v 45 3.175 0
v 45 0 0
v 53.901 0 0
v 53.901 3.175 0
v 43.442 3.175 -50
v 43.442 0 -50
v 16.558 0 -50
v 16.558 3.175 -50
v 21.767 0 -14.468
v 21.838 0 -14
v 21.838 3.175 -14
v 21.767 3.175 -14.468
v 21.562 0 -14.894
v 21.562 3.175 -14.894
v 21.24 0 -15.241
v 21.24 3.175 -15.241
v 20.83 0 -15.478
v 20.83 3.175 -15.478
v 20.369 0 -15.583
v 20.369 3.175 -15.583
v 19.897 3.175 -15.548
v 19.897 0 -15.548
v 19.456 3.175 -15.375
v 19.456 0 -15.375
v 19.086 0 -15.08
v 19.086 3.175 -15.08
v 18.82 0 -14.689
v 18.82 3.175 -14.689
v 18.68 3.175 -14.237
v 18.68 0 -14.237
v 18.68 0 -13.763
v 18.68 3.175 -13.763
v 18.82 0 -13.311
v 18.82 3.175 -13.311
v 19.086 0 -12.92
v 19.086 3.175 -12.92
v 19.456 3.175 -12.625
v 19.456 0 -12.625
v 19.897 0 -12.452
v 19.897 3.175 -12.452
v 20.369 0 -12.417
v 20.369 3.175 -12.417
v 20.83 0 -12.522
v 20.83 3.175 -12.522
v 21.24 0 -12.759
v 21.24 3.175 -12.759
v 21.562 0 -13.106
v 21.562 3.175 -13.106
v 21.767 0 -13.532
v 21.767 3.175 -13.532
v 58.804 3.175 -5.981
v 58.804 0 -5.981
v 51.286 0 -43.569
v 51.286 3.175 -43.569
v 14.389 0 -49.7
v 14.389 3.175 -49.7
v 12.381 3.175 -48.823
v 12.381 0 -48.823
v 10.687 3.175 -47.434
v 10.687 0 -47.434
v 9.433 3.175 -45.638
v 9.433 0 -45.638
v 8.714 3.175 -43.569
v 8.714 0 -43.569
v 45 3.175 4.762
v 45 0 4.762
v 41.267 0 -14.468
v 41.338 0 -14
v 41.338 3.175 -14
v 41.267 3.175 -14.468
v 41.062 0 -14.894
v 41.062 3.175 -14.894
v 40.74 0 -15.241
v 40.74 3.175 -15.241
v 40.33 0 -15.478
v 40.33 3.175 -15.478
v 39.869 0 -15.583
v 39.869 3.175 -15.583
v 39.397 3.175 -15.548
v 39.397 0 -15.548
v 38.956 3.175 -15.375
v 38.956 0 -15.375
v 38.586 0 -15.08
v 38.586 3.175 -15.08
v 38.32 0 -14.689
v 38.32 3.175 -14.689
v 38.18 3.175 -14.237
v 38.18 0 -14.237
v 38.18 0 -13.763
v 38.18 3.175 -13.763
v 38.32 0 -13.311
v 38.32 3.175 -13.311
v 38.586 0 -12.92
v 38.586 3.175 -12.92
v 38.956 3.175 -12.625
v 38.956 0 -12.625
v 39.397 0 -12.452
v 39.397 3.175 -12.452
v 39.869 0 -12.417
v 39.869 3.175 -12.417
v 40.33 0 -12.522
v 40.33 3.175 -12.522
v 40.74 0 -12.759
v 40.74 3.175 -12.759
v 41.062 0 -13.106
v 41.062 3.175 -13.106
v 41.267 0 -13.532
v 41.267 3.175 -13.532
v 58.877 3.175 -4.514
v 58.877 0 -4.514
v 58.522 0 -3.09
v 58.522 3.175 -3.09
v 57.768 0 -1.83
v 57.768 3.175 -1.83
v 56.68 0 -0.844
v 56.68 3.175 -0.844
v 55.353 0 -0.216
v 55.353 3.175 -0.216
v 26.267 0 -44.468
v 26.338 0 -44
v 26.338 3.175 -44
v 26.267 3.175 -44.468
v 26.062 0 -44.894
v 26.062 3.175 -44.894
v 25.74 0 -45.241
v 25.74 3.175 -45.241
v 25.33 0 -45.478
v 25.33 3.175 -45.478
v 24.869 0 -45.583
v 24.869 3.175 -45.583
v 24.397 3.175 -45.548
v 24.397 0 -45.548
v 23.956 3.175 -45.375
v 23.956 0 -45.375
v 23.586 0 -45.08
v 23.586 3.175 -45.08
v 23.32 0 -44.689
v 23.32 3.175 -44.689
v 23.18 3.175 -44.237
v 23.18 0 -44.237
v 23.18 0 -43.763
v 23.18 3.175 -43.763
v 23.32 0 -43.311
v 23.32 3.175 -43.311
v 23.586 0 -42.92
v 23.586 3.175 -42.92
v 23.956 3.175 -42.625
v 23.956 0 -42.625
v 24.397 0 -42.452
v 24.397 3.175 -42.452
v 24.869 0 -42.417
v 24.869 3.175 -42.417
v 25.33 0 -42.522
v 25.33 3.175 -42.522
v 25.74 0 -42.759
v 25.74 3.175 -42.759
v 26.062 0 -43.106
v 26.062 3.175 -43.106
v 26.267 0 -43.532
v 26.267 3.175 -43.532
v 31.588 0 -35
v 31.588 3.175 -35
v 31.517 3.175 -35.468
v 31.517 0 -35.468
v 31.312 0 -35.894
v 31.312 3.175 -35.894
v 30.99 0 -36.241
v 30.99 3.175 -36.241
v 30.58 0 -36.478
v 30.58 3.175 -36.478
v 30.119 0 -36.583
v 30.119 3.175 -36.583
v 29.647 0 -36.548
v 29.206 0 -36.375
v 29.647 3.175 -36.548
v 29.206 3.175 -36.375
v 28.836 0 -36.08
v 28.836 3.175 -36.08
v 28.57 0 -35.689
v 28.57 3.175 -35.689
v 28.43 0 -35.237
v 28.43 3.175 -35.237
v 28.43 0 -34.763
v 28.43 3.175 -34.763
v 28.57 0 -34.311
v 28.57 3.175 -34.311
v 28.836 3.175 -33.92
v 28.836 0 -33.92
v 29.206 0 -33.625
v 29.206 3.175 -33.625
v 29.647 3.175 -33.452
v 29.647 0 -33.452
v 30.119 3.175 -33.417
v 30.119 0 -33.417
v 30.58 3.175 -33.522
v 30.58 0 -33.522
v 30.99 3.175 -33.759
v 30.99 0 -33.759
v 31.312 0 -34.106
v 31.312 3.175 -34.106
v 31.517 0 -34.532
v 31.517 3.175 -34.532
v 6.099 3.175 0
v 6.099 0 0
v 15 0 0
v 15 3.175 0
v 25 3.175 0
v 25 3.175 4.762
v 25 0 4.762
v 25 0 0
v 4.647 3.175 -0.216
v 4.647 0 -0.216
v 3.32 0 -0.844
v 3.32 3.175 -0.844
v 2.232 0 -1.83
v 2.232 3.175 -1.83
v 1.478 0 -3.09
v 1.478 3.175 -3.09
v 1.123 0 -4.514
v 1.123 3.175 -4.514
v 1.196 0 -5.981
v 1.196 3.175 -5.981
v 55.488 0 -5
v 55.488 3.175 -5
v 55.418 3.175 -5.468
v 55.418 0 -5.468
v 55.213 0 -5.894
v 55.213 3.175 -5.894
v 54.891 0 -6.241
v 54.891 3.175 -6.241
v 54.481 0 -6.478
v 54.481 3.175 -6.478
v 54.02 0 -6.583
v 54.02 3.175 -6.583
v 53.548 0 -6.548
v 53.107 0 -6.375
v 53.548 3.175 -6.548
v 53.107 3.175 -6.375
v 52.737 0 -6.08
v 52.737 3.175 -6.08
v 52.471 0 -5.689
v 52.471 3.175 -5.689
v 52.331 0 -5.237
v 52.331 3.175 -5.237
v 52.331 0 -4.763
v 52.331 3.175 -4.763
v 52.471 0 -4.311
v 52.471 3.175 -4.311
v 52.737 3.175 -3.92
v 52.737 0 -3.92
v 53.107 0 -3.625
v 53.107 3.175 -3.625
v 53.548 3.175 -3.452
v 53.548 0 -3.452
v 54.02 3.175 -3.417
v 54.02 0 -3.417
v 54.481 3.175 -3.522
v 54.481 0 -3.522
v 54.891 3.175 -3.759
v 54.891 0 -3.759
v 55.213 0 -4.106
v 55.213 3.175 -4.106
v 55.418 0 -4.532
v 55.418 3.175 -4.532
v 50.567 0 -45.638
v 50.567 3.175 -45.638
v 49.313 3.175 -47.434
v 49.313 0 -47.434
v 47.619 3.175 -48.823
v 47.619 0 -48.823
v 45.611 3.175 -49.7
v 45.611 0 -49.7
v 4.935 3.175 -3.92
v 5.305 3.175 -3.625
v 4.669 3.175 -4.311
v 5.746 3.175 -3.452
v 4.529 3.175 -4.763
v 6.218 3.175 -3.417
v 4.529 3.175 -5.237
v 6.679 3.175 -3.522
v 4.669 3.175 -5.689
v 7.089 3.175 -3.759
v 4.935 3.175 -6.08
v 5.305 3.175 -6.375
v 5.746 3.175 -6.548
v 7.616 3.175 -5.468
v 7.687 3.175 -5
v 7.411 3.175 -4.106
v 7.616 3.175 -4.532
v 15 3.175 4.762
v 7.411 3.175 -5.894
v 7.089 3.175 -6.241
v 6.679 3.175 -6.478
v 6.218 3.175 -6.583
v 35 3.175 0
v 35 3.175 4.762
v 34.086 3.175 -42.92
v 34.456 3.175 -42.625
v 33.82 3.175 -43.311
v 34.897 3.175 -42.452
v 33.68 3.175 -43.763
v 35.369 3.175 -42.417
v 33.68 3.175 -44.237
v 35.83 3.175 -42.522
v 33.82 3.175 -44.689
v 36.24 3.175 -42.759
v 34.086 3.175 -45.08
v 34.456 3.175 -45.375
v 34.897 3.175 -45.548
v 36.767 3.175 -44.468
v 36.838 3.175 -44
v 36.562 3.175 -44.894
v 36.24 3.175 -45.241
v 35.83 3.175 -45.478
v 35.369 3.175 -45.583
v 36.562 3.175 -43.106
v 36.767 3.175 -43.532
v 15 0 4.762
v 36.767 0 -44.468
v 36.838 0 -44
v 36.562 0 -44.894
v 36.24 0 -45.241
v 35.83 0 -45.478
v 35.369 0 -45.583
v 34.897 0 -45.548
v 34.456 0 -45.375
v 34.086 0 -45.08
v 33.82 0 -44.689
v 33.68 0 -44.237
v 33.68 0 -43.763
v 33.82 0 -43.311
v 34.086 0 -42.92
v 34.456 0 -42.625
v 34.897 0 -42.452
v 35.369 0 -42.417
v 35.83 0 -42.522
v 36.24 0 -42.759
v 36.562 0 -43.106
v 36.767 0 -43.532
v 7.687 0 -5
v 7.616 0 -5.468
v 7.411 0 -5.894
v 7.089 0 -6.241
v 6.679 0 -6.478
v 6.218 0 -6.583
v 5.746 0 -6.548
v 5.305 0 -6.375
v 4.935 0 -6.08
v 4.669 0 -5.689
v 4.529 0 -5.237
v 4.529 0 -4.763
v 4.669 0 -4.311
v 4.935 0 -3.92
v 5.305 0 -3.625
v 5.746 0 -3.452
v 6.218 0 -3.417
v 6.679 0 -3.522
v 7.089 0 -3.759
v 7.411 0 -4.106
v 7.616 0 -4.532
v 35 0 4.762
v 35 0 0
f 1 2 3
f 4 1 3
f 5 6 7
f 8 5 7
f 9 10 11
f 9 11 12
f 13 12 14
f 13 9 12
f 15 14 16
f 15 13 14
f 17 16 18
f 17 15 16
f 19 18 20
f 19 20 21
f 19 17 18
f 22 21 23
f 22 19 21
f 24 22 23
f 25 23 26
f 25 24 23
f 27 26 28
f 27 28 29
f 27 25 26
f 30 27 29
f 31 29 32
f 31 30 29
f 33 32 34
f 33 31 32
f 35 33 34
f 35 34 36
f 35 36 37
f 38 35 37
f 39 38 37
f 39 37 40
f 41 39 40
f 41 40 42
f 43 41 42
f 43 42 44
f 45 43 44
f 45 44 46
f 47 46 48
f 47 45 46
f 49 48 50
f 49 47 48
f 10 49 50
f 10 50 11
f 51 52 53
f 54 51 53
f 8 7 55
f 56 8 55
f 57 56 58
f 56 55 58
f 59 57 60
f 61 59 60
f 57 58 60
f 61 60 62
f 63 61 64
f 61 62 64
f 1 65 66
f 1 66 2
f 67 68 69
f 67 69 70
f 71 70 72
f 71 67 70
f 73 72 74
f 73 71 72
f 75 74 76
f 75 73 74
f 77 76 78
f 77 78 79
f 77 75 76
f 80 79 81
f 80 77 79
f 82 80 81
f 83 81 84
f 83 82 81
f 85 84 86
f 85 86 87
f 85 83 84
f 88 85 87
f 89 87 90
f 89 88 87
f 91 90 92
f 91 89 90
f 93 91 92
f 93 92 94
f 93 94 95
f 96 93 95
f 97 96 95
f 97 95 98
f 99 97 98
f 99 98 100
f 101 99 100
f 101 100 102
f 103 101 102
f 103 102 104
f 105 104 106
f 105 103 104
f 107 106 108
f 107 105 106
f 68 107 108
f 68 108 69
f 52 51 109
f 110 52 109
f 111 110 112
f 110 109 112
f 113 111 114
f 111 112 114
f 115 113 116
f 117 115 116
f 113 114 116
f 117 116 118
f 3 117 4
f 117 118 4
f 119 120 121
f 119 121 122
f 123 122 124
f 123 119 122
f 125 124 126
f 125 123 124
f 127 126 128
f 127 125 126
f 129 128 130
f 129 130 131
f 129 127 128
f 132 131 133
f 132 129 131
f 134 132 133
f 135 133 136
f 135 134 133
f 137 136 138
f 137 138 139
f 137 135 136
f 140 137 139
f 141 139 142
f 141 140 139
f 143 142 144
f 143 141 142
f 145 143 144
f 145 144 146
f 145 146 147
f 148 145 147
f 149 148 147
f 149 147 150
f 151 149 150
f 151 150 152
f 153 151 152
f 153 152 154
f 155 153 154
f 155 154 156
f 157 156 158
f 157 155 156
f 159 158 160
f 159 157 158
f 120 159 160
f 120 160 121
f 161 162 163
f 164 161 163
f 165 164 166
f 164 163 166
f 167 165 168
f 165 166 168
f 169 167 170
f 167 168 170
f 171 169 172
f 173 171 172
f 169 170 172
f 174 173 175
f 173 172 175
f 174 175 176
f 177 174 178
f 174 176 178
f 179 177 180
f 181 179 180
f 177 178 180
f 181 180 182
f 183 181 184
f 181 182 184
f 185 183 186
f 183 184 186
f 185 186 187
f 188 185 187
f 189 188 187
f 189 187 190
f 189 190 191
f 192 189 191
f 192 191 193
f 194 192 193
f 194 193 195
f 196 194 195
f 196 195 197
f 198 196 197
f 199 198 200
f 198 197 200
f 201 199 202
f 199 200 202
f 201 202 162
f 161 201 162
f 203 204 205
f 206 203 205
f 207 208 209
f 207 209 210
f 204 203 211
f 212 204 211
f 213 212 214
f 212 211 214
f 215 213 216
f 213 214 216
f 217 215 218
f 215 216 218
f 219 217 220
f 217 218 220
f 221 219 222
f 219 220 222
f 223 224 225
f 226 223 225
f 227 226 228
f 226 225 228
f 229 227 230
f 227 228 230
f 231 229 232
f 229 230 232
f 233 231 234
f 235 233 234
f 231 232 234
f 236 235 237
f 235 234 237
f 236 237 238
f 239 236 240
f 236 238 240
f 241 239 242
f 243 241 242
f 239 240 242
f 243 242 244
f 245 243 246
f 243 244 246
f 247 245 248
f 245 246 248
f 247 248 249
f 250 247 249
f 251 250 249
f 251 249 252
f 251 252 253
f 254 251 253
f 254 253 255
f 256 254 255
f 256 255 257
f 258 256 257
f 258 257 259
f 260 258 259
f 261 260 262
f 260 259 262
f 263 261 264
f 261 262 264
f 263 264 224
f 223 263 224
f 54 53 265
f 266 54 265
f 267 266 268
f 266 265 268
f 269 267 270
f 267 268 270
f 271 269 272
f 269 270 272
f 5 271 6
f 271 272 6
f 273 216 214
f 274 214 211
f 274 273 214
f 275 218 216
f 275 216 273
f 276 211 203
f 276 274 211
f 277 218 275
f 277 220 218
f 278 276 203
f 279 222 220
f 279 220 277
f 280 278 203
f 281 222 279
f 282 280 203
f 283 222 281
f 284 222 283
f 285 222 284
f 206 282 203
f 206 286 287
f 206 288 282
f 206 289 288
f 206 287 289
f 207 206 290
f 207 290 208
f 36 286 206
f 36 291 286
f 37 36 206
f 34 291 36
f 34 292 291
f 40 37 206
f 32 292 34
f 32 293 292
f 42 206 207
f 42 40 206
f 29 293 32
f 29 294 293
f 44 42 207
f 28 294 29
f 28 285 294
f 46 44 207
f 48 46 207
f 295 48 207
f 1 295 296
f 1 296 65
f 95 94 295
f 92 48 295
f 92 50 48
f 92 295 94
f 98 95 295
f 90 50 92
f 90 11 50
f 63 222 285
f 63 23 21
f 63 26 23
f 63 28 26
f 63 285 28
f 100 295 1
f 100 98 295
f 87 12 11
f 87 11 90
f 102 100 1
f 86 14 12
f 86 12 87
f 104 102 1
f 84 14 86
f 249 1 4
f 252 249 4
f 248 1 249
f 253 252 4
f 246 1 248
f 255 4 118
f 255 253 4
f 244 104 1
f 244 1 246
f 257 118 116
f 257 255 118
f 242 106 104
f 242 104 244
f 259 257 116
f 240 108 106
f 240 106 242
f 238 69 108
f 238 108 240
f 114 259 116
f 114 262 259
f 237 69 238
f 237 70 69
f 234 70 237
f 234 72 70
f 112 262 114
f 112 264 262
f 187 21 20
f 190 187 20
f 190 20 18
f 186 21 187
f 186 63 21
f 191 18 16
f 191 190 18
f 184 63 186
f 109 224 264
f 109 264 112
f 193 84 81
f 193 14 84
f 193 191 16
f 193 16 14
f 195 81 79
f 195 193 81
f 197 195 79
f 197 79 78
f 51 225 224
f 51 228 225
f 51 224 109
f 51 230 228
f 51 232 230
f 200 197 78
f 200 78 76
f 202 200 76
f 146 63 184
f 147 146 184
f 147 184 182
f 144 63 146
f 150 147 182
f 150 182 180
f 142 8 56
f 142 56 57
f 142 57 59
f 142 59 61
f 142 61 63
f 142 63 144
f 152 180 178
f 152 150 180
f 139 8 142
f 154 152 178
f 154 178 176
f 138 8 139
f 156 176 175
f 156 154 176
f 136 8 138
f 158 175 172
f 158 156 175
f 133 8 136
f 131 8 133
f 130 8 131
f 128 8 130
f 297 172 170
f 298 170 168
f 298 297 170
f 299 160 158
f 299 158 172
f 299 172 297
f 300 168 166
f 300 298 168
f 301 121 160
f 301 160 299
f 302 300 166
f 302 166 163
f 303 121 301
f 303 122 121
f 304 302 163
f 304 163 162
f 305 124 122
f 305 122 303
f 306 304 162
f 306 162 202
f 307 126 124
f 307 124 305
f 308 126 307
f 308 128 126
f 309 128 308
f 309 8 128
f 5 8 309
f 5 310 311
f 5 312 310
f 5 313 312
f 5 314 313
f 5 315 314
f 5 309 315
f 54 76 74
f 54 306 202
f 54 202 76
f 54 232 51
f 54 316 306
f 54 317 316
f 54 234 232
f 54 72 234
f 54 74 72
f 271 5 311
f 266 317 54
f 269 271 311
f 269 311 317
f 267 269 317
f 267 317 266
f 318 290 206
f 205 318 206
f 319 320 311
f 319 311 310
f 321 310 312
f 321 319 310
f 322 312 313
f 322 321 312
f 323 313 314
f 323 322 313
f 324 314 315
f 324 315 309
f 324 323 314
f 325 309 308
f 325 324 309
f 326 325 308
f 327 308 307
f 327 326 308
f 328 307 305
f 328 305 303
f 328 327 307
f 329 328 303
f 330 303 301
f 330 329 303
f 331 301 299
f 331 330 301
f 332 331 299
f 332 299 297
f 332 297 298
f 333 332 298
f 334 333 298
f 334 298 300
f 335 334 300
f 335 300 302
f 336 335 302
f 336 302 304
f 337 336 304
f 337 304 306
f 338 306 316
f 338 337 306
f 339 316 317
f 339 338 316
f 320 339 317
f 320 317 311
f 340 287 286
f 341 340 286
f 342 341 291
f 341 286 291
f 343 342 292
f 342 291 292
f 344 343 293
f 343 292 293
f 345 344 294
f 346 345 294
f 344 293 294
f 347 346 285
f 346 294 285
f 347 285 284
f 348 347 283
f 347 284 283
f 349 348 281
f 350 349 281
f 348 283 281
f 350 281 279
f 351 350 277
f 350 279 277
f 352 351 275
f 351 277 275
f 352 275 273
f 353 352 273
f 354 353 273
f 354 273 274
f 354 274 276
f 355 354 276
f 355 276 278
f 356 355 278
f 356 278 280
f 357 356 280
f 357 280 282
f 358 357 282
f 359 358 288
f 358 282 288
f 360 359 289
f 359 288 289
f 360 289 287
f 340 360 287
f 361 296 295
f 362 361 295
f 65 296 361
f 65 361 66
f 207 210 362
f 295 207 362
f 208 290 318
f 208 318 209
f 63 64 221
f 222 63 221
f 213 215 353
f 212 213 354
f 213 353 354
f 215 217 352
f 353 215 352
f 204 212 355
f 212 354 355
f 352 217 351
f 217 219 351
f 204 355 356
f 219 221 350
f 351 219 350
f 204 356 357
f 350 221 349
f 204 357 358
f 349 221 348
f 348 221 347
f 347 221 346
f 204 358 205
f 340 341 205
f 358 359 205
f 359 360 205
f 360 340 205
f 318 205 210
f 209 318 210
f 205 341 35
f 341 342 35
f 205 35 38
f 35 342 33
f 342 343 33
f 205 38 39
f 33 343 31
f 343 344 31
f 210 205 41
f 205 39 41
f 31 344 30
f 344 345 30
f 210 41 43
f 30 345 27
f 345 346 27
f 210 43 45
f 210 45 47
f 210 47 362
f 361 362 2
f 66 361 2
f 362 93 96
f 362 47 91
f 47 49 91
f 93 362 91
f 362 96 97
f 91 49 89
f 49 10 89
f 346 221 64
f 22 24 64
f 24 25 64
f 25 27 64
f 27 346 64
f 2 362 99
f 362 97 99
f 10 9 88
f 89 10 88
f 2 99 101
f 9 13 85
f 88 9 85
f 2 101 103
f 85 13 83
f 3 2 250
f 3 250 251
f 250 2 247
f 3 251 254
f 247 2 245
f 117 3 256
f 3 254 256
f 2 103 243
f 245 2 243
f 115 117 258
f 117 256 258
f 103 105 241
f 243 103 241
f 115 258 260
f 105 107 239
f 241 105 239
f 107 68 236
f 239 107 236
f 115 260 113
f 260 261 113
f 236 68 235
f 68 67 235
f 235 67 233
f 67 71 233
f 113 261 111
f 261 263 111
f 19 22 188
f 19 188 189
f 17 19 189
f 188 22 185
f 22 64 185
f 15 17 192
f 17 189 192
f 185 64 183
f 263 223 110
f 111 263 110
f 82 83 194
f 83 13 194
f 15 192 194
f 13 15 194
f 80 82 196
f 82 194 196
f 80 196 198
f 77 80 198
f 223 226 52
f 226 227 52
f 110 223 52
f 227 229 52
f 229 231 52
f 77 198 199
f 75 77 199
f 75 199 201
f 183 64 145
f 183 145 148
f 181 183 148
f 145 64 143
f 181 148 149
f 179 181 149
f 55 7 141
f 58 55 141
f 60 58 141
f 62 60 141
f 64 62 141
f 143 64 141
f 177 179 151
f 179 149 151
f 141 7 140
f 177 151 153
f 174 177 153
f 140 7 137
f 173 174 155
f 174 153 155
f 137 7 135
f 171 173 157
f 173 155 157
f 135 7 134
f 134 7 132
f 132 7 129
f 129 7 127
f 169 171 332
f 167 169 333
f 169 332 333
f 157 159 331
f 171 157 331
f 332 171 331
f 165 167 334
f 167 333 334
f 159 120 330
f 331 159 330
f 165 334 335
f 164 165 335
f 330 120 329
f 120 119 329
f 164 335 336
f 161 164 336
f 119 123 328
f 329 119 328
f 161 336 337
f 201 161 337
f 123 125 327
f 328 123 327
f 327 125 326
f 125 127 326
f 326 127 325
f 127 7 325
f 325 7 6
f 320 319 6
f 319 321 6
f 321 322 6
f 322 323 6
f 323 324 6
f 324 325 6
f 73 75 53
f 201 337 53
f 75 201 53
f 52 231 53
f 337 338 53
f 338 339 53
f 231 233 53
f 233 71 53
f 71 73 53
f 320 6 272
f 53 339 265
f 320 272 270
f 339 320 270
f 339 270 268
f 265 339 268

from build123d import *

# Parameters (mm, degrees)
CROQUIS1_R              = 1.5875
SALIENTE_EXTRUIR1_DEPTH = 3.175
CROQUIS2_R              = 1.5875
CORTAR_EXTRUIR1_DEPTH   = 3.175
CROQUIS3_W              = 10
CROQUIS3_H              = 4.7625
SALIENTE_EXTRUIR2_DEPTH = 3.175


with BuildPart() as part:
    # Croquis1 → Saliente-Extruir1 (new body)
    with BuildSketch(Plane(origin=(0, 0, 0), x_dir=(1, 0, 0), z_dir=(0, 1, 0))):
        with BuildLine():
            Line((8.713785816, 43.568929081), (0, 0))
            Line((0, 0), (60, 0))
            Line((60, 0), (51.286214184, 43.568929081))
            ThreePointArc((51.286214184, 43.568929081), (48.513480023, 48.186737131), (43.441568778, 50))
            Line((43.441568778, 50), (16.558431222, 50))
            ThreePointArc((16.558431222, 50), (11.486519977, 48.186737131), (8.713785816, 43.568929081))
        make_face()
        with Locations((39.75, 14)):
            Circle(CROQUIS1_R, mode=Mode.SUBTRACT)
        with Locations((20.25, 14)):
            Circle(CROQUIS1_R, mode=Mode.SUBTRACT)
        with Locations((24.75, 44)):
            Circle(CROQUIS1_R, mode=Mode.SUBTRACT)
        with Locations((35.25, 44)):
            Circle(CROQUIS1_R, mode=Mode.SUBTRACT)
    extrude(amount=SALIENTE_EXTRUIR1_DEPTH)

    # Croquis2 → Cortar-Extruir1 (cut)
    with BuildSketch(Plane(origin=(0, 3.175, 0), x_dir=(1, 0, 0), z_dir=(0, 1, 0))):
        with Locations((30, 35)):
            Circle(CROQUIS2_R)
        with Locations((6.099019514, 5)):
            Circle(CROQUIS2_R)
        with Locations((53.900980486, 5)):
            Circle(CROQUIS2_R)
        with BuildLine():
            Line((53.900980486, 0), (60, 0))
            Line((60, 0), (58.803883865, 5.980580676))
            ThreePointArc((58.803883865, 5.980580676), (57.767691193, 1.830055472), (53.900980486, 0))
        make_face()
        with BuildLine():
            Line((1.196116135, 5.980580676), (0, 0))
            Line((0, 0), (6.099019514, 0))
            ThreePointArc((6.099019514, 0), (2.232308807, 1.830055472), (1.196116135, 5.980580676))
        make_face()
    extrude(amount=-CORTAR_EXTRUIR1_DEPTH, mode=Mode.SUBTRACT)

    # Croquis3 → Saliente-Extruir2 (add)
    with BuildSketch(Plane(origin=(0, 3.175, 0), x_dir=(1, 0, 0), z_dir=(0, 1, 0))):
        with Locations((20, -2.38125)):
            Rectangle(CROQUIS3_W, CROQUIS3_H)
        with Locations((40, -2.38125)):
            Rectangle(CROQUIS3_W, CROQUIS3_H)
    extrude(amount=-SALIENTE_EXTRUIR2_DEPTH)


solid = part.part
